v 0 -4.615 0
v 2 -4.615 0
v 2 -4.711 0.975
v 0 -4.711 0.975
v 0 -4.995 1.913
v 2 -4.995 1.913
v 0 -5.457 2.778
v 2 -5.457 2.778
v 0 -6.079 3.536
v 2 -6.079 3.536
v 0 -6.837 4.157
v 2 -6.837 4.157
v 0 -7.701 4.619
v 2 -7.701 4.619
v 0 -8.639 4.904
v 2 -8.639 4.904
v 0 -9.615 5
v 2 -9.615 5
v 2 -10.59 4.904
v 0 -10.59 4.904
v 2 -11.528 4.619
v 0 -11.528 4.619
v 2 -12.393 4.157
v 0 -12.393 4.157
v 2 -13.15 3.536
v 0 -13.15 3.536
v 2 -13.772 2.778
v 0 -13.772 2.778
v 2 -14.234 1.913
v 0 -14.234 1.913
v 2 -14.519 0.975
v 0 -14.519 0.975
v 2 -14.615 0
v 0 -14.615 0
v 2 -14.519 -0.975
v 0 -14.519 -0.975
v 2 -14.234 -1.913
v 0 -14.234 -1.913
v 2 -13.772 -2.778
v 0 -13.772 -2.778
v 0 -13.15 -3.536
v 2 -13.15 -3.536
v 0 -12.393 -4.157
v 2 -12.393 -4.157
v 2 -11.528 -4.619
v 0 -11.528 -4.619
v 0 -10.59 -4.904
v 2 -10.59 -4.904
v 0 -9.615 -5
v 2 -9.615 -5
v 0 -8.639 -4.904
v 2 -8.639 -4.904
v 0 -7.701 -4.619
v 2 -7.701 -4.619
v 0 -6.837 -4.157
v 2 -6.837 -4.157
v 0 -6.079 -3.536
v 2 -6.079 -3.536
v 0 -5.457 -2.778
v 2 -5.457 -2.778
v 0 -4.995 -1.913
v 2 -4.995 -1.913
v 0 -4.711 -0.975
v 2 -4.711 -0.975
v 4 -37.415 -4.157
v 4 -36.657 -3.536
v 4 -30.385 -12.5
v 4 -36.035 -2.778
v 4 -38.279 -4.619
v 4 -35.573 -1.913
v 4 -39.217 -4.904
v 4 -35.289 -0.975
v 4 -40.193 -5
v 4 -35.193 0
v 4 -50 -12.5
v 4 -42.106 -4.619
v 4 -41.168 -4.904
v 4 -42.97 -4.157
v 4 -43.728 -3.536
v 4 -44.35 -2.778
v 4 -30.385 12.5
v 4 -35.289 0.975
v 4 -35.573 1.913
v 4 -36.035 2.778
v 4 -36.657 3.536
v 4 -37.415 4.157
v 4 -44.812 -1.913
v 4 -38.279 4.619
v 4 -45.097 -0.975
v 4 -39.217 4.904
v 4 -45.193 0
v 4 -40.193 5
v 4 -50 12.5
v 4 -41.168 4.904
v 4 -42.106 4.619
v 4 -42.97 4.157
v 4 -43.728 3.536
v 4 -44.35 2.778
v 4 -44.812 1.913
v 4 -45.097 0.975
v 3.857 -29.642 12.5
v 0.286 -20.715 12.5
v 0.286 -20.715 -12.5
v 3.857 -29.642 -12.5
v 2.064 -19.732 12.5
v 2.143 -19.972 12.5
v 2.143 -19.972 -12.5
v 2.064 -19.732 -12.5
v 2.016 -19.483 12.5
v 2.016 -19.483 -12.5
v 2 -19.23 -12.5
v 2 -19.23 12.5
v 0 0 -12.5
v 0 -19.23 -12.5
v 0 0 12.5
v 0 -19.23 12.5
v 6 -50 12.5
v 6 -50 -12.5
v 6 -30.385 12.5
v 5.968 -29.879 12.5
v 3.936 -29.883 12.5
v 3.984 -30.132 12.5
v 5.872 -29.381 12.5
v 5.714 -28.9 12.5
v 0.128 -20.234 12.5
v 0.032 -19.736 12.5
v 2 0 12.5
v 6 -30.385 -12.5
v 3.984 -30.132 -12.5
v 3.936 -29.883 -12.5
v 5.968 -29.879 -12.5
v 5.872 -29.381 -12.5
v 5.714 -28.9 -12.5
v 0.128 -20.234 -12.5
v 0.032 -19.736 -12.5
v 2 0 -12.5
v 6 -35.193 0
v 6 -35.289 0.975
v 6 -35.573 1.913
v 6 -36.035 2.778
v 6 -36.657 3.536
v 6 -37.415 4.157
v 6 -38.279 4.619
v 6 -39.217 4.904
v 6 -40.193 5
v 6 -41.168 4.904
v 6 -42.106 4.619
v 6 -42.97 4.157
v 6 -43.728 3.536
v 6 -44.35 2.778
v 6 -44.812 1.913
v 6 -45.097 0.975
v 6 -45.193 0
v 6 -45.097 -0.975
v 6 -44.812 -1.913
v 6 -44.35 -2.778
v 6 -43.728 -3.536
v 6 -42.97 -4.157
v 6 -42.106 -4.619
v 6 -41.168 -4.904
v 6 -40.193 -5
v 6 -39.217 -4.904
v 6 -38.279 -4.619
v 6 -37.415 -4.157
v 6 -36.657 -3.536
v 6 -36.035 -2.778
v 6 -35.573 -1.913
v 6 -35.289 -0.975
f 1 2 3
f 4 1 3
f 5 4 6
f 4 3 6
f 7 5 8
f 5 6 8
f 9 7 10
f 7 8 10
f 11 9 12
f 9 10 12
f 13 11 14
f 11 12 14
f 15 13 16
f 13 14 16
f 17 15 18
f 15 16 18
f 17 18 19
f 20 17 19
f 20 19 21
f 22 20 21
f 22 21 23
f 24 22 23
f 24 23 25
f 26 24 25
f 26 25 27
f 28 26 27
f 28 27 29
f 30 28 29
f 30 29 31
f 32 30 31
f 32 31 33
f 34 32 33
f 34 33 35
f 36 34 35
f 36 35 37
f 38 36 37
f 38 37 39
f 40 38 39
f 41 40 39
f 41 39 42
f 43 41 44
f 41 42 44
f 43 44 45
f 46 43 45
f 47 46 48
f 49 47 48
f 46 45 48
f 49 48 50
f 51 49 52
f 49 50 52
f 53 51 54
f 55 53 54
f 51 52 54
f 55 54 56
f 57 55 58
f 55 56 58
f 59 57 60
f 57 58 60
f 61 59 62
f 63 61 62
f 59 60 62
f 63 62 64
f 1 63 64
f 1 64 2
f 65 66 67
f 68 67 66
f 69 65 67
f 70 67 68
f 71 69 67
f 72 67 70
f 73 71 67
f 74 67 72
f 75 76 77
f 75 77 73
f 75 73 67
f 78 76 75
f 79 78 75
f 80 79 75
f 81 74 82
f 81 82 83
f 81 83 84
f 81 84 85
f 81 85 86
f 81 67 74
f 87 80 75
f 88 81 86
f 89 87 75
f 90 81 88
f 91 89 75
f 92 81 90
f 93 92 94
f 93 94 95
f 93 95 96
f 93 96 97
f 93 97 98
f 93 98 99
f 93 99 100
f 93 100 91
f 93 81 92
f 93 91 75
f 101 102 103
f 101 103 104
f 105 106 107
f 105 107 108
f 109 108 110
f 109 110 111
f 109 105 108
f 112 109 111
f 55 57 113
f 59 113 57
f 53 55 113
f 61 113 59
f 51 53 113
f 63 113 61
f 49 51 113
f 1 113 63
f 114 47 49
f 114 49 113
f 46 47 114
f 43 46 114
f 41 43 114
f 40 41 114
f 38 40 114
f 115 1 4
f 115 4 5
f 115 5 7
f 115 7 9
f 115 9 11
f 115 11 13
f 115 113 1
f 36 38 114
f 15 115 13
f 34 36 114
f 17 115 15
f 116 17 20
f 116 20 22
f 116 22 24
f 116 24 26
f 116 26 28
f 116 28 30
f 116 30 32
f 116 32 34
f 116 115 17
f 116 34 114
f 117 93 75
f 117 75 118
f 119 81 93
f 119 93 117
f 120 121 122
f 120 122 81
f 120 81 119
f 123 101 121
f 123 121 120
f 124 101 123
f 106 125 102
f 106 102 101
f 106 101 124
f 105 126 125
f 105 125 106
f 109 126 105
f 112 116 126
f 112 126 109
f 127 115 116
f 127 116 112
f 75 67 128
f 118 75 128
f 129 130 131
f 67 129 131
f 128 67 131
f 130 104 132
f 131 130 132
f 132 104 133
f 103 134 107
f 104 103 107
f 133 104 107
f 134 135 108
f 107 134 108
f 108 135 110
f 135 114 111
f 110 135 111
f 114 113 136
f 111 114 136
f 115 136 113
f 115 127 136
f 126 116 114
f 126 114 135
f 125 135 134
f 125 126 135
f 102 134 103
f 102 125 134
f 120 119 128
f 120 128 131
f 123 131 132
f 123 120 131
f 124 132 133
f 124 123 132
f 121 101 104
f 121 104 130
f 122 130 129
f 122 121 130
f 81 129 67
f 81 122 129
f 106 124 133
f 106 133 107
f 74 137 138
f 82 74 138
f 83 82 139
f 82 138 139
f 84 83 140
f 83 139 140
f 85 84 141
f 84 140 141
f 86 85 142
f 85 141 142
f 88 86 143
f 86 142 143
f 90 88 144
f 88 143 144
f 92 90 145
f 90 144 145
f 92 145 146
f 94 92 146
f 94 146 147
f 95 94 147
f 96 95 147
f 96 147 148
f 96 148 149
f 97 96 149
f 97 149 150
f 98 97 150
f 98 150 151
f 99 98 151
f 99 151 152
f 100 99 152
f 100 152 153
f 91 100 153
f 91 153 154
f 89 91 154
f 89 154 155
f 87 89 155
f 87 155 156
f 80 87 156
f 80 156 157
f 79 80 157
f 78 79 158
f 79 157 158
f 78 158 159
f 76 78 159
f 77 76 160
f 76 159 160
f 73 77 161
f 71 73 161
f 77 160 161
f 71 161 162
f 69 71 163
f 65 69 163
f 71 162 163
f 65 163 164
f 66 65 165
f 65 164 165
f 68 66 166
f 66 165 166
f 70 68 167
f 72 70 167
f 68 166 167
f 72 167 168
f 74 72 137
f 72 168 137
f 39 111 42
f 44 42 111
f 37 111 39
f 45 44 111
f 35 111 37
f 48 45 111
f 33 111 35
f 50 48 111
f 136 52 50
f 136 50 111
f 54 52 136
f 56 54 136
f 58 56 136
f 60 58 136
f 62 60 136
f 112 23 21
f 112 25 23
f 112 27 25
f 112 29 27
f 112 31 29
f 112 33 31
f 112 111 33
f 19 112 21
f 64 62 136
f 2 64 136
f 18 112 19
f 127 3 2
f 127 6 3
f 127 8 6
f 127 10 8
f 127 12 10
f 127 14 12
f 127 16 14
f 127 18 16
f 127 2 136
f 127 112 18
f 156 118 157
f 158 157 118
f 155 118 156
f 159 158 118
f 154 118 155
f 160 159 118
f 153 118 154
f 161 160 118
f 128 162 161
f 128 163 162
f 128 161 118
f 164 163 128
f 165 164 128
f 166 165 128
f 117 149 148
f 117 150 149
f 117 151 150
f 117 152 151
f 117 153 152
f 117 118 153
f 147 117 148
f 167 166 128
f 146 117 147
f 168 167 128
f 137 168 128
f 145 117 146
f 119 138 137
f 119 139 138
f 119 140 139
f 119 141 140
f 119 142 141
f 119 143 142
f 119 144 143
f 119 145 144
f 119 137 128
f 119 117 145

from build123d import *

# Parameters (mm, degrees)
FLANGE_BASE1_DEPTH    = 12.5
ESBO_O3_R             = 5
CORTE_EXTRUS_O1_DEPTH = 10


# Sheet-metal steps are written as plain solids
with BuildPart() as part:
    # Esboço1 → Flange-base1 (new, symmetric)
    with BuildSketch(Plane.XY):
        with BuildLine():
            Line((0, 0), (0, -19.229670386))
            ThreePointArc((0, -19.229670386), (0.072174453, -19.98610047), (0.286093236, -20.715233091))
            Line((0.286093236, -20.715233091), (3.856953382, -29.642383454))
            ThreePointArc((3.856953382, -29.642383454), (3.963912773, -30.006949765), (4, -30.385164807))
            Line((4, -30.385164807), (4, -50))
            Line((4, -50), (6, -50))
            Line((6, -50), (6, -30.385164807))
            ThreePointArc((6, -30.385164807), (5.927825547, -29.628734723), (5.713906764, -28.899602102))
            Line((5.713906764, -28.899602102), (2.143046618, -19.972451738))
            ThreePointArc((2.143046618, -19.972451738), (2.036087227, -19.607885428), (2, -19.229670386))
            Line((2, -19.229670386), (2, 0))
            Line((2, 0), (0, 0))
        make_face()
    extrude(amount=FLANGE_BASE1_DEPTH, both=True)

    # Esboço3 → Corte-extrusão1 (cut)
    with BuildSketch(Plane(origin=(6, 0, 0), x_dir=(0, 0, -1), z_dir=(1, 0, 0))):
        with Locations(Location((0, -40.192582404, 0), (0, 0, 90))):
            Circle(ESBO_O3_R)
        with Locations(Location((0, -9.614835193, 0), (0, 0, 90))):
            Circle(ESBO_O3_R)
    extrude(amount=-CORTE_EXTRUS_O1_DEPTH, mode=Mode.SUBTRACT)


solid = part.part
